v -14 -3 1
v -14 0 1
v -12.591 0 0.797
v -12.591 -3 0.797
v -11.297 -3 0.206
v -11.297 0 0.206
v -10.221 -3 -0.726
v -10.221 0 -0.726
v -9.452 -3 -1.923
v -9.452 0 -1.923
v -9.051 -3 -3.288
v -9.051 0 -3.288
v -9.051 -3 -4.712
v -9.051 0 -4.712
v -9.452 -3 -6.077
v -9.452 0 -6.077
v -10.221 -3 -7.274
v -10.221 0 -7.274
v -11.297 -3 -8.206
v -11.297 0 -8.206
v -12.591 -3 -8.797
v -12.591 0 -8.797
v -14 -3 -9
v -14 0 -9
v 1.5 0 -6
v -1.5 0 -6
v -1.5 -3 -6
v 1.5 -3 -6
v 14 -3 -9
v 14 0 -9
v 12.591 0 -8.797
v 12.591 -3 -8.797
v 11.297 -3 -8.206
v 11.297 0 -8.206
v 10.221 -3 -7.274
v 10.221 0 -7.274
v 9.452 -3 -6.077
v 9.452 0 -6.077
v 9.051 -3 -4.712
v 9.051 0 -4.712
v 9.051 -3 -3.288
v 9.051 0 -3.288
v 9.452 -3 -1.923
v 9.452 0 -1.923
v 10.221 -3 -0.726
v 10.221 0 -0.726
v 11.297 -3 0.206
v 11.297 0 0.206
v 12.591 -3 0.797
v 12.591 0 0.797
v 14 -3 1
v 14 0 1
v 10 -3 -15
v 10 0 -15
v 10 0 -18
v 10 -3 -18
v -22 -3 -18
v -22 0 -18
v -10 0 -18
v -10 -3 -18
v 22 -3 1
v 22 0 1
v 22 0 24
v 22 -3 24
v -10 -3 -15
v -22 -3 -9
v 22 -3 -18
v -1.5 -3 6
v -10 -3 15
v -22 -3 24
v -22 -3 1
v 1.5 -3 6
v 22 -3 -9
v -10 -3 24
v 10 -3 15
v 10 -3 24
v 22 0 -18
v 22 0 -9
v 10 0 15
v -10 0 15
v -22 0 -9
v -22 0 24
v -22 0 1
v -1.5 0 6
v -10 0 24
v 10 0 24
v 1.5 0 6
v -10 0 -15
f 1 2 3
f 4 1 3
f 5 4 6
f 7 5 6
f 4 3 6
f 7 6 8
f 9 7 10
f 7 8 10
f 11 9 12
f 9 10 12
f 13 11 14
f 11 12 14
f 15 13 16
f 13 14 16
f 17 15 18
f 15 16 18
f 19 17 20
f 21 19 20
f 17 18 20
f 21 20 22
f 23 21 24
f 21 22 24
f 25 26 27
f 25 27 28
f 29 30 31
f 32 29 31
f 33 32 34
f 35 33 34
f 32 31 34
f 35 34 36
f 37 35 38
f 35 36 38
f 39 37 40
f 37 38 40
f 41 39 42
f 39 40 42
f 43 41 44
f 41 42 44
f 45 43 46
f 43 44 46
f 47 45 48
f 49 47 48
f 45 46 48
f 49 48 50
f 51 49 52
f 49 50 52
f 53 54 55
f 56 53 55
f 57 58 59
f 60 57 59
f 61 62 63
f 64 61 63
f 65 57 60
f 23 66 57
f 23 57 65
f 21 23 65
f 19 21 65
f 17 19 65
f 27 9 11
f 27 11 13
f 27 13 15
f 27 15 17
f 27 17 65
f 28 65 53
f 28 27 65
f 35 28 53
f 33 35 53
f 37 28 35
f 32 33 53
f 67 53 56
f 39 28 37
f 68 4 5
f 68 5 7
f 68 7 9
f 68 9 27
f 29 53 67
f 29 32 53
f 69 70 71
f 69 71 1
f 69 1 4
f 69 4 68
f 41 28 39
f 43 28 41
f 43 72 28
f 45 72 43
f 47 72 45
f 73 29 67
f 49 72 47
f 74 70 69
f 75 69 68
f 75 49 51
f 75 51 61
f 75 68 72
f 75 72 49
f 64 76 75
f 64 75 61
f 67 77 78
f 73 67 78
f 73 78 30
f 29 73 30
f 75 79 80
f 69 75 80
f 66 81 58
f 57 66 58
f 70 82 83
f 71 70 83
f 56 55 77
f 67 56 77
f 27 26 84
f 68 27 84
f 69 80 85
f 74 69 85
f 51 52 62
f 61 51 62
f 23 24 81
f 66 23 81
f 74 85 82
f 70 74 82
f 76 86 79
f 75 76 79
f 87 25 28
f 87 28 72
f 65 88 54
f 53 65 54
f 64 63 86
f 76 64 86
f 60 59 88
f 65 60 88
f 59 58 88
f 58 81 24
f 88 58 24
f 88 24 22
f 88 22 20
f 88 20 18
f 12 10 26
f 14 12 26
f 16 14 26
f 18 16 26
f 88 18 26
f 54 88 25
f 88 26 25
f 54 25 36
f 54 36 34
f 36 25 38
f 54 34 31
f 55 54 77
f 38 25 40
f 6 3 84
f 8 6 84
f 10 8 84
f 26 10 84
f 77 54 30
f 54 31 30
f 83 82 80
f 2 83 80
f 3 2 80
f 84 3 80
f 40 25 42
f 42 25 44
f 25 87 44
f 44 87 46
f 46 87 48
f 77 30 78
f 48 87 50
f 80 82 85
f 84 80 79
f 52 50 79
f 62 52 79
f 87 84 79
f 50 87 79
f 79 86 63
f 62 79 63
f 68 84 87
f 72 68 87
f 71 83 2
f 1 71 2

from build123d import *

# Parameters (mm, degrees)
F0_W     = 3
F0_H     = 12
F1_DEPTH = 3


with BuildPart() as f1:
    # F0 (on Front) → F1 (new body)
    with BuildSketch(Plane.XZ):
        with BuildLine():
            Line((10, 24), (10, 15))
            Line((10, 15), (-10, 15))
            Line((-10, 15), (-10, 24))
            Line((-10, 24), (-22, 24))
            Line((-22, 24), (-22, 15))
            Line((-22, 15), (-22, 1))
            Line((-22, 1), (-14, 1))
            ThreePointArc((-14, 1), (-9, -4), (-14, -9))
            Line((-14, -9), (-22, -9))
            Line((-22, -9), (-22, -15))
            Line((-22, -15), (-22, -18))
            Line((-22, -18), (-10, -18))
            Line((-10, -18), (-10, -15))
            Line((-10, -15), (10, -15))
            Line((10, -15), (10, -18))
            Line((10, -18), (22, -18))
            Line((22, -18), (22, -15))
            Line((22, -15), (22, -9))
            Line((22, -9), (14, -9))
            ThreePointArc((14, -9), (9, -4), (14, 1))
            Line((14, 1), (22, 1))
            Line((22, 1), (22, 15))
            Line((22, 15), (22, 24))
            Line((22, 24), (10, 24))
        make_face()
        Rectangle(F0_W, F0_H, mode=Mode.SUBTRACT)
    extrude(amount=F1_DEPTH)


solid = f1.part
